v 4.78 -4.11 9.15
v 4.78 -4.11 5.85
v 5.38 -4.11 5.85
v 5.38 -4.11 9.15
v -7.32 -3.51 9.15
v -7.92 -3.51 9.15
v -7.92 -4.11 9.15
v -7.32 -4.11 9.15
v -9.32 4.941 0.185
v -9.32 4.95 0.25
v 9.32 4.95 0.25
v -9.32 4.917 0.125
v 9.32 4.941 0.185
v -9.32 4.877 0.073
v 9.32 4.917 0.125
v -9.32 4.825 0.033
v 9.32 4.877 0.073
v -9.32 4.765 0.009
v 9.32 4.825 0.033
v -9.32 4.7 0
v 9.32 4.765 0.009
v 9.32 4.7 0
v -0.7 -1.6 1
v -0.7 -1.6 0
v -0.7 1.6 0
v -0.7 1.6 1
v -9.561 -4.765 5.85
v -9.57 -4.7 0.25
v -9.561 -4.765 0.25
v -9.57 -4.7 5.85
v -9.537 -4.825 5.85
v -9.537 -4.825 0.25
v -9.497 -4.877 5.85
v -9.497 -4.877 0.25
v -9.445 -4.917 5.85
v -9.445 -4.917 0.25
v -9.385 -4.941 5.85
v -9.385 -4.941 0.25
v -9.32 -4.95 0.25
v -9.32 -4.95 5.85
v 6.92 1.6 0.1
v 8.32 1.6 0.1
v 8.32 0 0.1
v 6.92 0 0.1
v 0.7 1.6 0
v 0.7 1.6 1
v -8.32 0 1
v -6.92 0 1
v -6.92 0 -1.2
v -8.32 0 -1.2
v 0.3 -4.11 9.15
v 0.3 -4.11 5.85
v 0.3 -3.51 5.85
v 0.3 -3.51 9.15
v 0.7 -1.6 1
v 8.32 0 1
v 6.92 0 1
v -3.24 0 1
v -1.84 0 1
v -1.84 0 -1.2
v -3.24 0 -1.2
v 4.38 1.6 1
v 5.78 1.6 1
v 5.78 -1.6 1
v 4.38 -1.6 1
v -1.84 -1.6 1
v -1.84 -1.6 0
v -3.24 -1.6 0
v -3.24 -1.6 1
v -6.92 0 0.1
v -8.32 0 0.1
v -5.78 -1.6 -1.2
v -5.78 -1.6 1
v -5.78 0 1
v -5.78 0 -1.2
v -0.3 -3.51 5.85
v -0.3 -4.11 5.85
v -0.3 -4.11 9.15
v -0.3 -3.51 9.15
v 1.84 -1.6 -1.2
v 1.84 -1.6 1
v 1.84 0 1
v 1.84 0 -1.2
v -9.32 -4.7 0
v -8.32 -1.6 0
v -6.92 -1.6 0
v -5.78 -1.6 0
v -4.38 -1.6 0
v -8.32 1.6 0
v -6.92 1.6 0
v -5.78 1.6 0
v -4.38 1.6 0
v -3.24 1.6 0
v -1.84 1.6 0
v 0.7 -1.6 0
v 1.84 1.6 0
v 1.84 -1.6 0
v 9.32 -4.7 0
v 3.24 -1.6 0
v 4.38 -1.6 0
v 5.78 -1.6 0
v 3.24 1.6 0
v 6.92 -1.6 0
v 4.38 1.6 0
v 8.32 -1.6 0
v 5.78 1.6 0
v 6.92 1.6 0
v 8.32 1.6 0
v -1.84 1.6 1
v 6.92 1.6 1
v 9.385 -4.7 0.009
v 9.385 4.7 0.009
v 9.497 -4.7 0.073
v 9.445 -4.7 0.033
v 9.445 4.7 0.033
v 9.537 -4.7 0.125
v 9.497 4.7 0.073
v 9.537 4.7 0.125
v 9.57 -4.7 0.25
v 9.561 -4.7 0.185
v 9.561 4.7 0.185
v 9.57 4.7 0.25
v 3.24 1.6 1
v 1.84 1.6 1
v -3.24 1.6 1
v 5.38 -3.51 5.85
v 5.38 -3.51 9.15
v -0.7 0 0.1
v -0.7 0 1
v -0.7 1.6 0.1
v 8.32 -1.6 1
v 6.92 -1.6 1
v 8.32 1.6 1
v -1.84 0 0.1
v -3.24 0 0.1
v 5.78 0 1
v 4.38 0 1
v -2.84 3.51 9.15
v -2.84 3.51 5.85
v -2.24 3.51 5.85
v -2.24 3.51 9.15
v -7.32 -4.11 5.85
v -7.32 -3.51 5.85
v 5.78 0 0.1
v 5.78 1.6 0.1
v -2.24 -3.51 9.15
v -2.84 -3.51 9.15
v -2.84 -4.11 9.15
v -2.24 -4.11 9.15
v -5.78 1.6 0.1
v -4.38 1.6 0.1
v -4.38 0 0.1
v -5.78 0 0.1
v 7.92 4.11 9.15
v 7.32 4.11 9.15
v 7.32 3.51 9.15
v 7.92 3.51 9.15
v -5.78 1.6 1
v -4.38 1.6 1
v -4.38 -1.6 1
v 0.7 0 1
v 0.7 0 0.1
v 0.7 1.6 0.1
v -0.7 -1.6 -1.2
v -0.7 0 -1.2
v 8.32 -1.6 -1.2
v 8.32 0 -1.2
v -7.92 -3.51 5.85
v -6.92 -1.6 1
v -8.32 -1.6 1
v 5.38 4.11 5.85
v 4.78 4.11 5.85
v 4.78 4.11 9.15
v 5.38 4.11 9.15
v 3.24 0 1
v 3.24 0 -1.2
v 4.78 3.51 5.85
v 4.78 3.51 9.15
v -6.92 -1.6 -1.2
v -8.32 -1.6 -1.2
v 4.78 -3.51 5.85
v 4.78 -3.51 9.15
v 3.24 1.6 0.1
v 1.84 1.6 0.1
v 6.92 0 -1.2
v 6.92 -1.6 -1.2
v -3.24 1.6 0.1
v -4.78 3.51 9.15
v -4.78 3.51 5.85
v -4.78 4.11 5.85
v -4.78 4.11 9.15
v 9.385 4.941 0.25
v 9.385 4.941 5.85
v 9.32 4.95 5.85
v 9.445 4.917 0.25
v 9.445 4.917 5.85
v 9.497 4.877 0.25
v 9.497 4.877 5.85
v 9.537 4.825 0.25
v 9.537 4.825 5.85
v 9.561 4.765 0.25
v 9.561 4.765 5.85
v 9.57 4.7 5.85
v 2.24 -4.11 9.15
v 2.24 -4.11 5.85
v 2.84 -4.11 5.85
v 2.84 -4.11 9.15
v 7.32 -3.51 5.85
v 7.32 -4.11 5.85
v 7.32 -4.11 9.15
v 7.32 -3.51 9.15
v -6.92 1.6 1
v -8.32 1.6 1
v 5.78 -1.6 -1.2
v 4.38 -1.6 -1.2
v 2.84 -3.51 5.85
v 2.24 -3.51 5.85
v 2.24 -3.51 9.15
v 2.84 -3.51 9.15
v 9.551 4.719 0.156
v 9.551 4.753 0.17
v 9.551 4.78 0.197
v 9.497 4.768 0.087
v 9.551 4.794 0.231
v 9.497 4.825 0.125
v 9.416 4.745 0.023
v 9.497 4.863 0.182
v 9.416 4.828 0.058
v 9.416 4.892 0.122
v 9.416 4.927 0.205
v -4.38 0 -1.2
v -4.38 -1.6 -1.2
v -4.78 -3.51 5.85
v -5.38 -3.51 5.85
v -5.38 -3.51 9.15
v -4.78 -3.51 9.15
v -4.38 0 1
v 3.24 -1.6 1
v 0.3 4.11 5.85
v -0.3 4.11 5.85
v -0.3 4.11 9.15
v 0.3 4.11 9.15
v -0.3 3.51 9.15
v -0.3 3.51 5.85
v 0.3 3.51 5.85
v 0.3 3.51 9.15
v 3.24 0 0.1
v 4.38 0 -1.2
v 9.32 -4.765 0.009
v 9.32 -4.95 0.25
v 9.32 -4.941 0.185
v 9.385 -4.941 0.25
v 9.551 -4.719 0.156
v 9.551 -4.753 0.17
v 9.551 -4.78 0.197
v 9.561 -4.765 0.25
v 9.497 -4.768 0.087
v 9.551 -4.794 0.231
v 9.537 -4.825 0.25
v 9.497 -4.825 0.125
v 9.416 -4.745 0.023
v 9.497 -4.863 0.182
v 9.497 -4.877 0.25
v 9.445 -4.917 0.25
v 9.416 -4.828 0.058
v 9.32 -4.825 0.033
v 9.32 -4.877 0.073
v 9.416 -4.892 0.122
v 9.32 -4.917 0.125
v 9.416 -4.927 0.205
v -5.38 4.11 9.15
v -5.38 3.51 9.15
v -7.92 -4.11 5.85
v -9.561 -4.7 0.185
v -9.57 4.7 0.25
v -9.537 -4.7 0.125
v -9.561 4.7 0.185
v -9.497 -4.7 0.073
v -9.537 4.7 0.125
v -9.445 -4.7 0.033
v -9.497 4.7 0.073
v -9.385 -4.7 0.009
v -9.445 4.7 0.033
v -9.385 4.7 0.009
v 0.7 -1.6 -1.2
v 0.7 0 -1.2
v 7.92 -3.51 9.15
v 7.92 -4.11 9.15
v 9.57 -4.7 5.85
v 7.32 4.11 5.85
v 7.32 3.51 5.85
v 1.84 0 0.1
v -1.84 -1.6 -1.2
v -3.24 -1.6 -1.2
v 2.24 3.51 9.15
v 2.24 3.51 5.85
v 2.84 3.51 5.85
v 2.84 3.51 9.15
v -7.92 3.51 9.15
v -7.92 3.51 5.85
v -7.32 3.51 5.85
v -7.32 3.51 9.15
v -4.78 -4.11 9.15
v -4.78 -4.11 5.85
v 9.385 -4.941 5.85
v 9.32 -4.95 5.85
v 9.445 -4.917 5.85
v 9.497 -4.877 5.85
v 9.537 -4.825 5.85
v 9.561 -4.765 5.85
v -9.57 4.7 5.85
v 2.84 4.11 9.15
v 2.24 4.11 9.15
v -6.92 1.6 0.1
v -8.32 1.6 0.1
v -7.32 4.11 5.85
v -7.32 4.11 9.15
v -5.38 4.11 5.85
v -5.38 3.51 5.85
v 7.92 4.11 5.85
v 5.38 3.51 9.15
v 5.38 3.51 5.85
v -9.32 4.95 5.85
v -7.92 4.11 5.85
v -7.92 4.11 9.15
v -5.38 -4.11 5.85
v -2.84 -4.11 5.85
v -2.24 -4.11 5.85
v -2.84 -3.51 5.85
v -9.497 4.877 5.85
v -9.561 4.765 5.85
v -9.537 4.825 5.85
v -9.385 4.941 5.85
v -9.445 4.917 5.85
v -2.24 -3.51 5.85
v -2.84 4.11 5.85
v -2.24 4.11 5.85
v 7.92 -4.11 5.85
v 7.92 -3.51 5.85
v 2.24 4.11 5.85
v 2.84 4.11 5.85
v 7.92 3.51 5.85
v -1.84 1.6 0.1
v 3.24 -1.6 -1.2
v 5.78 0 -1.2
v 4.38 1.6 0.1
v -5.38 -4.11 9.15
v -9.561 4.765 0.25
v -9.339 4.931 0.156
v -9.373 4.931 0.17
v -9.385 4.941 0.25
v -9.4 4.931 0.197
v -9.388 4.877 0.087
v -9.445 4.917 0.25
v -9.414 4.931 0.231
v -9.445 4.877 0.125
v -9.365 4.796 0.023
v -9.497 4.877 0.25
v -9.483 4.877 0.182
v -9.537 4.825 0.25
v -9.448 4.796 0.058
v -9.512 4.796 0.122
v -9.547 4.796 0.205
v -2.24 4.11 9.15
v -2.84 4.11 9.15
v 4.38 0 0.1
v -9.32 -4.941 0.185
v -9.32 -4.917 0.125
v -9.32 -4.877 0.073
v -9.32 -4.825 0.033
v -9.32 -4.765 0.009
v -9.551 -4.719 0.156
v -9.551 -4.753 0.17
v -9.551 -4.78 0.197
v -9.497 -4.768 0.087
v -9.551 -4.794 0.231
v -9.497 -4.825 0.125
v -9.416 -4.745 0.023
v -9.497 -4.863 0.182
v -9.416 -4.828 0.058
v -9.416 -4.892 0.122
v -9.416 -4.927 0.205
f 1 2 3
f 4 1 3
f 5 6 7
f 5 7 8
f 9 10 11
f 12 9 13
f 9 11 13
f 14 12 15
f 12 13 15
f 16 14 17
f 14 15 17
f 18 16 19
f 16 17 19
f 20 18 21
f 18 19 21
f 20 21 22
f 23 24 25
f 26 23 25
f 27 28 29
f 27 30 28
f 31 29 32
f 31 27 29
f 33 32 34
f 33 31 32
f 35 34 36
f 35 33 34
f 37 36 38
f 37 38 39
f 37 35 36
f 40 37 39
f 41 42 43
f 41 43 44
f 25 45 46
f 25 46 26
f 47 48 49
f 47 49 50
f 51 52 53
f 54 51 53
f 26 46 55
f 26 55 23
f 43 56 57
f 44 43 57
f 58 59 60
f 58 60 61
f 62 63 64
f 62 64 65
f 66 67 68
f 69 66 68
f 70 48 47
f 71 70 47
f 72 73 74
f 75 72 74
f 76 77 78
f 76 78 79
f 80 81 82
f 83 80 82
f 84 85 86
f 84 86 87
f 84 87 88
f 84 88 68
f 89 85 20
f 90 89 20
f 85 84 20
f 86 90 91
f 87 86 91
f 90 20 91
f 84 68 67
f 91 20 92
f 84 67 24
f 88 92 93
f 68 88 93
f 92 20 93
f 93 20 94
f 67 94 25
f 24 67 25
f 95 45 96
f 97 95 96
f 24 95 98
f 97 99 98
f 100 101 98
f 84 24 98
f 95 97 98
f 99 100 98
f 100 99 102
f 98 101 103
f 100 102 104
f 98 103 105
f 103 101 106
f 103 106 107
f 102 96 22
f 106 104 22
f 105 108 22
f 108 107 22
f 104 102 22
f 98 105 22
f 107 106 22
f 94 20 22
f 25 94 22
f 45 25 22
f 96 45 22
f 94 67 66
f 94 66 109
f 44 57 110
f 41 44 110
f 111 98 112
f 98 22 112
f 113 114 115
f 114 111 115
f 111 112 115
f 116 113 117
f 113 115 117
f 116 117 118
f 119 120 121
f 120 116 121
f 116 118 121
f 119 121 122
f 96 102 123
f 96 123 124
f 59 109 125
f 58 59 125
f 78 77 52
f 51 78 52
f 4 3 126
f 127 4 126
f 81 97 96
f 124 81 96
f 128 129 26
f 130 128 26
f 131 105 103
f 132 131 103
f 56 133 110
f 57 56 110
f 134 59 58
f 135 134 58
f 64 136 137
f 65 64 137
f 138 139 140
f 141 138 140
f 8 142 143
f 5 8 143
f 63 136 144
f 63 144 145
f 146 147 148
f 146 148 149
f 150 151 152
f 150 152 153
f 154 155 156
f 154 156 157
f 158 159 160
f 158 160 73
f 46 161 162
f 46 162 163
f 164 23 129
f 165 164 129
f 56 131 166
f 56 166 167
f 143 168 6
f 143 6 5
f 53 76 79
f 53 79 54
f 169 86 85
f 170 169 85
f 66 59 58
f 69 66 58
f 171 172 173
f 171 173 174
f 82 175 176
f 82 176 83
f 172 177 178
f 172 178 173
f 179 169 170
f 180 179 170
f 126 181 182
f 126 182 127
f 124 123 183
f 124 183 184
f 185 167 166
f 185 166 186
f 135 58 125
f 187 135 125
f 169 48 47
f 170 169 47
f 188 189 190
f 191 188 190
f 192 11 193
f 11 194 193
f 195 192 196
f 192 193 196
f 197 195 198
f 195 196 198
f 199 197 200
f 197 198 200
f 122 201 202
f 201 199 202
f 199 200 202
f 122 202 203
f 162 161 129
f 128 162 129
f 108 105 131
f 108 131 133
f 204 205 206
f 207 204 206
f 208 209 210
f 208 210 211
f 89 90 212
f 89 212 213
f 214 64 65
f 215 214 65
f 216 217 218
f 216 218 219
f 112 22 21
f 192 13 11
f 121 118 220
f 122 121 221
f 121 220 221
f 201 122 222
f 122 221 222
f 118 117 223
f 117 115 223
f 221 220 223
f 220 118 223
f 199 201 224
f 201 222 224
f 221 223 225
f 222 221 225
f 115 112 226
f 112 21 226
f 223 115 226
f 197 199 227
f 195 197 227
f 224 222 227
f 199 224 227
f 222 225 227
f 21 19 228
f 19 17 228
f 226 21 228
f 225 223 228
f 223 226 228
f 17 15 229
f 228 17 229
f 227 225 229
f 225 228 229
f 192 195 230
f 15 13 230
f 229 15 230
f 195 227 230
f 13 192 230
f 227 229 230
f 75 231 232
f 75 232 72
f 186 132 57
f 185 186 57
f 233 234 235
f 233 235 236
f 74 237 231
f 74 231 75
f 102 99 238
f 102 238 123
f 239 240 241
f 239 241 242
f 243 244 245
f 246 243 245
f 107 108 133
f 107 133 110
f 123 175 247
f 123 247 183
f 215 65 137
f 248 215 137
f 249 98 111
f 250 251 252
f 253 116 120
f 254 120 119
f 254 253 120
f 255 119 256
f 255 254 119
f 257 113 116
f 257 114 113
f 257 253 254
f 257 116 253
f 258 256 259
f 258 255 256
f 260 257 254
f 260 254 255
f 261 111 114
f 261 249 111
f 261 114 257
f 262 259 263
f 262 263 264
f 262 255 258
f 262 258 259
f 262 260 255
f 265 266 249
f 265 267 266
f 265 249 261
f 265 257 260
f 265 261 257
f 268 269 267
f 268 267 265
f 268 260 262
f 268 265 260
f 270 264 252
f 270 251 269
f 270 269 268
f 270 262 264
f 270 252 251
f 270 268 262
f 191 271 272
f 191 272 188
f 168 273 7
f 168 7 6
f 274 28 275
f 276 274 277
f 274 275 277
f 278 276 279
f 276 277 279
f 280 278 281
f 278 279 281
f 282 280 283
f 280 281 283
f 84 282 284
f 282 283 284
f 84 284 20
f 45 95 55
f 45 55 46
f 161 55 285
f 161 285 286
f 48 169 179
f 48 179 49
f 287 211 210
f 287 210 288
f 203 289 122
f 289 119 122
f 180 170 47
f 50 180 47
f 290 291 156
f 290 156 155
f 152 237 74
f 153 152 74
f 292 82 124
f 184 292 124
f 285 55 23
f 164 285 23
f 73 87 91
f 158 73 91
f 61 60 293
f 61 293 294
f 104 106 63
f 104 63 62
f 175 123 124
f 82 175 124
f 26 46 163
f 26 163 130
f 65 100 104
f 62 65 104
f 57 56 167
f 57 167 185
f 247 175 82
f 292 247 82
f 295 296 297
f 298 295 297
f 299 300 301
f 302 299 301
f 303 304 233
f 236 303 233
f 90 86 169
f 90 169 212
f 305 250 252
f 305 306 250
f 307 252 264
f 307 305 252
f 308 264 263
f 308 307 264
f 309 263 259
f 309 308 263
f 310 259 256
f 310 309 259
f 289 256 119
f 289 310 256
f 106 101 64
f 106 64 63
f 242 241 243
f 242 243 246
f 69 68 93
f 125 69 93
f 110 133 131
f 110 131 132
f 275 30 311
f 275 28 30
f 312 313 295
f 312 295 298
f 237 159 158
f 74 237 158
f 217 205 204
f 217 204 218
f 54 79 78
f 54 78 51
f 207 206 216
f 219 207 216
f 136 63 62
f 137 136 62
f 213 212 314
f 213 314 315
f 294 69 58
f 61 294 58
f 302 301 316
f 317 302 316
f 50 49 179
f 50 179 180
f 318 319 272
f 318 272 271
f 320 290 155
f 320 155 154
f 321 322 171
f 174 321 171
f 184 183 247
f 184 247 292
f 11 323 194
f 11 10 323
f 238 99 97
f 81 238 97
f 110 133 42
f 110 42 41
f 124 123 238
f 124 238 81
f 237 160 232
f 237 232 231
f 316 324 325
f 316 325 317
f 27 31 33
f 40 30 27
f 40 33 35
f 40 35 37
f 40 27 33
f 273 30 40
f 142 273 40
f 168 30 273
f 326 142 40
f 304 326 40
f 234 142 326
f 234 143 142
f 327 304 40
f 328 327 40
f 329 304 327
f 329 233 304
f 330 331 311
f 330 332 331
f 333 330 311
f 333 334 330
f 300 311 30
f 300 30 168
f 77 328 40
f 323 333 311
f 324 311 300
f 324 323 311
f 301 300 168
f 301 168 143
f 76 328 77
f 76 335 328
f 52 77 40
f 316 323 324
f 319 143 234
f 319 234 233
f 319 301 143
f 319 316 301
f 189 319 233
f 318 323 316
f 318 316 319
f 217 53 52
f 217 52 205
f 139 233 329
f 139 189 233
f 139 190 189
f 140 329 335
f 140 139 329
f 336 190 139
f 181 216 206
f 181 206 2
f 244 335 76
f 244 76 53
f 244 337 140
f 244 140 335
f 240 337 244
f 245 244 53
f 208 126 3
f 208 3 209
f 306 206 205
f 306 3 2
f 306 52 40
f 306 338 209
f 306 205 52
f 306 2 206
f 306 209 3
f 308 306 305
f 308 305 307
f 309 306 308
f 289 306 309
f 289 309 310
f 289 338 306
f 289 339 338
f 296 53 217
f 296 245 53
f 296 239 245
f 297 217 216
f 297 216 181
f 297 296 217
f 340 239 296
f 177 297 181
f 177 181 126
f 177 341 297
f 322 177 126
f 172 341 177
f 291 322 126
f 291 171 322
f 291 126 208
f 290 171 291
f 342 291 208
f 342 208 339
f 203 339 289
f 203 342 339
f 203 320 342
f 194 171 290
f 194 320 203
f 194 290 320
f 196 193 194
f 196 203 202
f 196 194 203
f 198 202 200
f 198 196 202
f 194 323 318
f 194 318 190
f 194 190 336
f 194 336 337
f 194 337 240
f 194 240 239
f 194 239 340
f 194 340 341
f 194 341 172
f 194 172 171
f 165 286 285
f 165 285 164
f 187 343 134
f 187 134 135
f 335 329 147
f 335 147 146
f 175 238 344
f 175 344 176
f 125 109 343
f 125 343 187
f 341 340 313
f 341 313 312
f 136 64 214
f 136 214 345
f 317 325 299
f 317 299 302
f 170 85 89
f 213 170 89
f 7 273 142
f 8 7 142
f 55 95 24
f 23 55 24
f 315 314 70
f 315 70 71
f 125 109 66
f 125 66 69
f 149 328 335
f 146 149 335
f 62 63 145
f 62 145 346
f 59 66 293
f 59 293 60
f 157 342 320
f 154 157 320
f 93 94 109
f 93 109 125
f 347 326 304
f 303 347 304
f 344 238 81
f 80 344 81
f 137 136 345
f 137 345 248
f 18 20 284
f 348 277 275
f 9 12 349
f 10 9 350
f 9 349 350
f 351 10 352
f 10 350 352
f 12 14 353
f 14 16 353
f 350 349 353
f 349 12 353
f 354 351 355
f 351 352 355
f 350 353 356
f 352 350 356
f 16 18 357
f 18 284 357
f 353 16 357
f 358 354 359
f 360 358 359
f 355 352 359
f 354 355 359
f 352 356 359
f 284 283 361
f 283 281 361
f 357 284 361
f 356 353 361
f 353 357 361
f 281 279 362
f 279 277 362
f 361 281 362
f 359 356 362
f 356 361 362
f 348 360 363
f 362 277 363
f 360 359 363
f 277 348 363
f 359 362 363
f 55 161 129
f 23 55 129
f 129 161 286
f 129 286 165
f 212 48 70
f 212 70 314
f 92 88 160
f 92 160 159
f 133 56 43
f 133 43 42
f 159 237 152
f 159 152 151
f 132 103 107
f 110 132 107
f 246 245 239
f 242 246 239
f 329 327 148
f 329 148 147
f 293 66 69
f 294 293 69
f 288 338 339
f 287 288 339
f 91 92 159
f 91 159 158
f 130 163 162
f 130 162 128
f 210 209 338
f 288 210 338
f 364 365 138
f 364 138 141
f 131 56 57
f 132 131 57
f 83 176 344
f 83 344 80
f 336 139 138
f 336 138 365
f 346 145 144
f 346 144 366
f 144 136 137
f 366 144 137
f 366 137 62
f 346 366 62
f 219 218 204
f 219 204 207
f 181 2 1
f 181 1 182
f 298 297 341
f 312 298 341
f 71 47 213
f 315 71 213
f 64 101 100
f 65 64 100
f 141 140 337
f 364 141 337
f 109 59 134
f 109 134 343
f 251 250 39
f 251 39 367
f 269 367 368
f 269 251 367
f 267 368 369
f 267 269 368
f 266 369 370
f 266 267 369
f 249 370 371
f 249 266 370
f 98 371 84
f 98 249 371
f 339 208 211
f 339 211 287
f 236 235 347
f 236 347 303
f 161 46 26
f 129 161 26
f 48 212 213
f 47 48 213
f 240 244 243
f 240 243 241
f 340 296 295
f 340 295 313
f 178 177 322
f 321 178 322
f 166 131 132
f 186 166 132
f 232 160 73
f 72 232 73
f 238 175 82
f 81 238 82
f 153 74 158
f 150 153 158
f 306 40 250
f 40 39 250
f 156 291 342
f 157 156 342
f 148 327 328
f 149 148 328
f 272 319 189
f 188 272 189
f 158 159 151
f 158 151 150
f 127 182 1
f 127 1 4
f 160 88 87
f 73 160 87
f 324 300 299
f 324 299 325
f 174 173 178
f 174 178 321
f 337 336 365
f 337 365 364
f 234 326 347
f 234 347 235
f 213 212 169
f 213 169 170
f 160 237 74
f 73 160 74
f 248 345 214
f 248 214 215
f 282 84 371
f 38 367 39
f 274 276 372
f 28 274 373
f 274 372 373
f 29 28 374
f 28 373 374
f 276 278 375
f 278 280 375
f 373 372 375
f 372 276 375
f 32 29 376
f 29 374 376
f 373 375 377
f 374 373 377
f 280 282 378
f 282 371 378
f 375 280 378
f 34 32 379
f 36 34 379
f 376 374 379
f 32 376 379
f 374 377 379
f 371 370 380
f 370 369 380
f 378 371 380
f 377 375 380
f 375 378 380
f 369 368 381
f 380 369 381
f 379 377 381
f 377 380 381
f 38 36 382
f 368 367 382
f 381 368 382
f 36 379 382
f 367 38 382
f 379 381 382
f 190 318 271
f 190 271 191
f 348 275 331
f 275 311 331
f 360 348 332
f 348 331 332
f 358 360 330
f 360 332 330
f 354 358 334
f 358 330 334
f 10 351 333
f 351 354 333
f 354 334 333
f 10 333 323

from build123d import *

# Parameters (mm, degrees)
IZIM1_W                       = 19.14
IZIM1_H                       = 9.9
Y_KSEKLIK_EKSTR_ZYON1_DEPTH   = 5.85
IZIM2_W                       = 1.4
IZIM2_H                       = 3.2
KES_EKSTR_ZYON1_DEPTH         = 1
IZIM3_W                       = 1.4
IZIM3_H                       = 1.6
Y_KSEKLIK_EKSTR_ZYON2_DEPTH   = 2.2
Y_KSEKLIK_EKSTR_ZYON2_2_DEPTH = 2.2
Y_KSEKLIK_EKSTR_ZYON2_3_DEPTH = 2.2
Y_KSEKLIK_EKSTR_ZYON2_4_DEPTH = 2.2
Y_KSEKLIK_EKSTR_ZYON2_5_DEPTH = 2.2
Y_KSEKLIK_EKSTR_ZYON2_6_DEPTH = 2.2
Y_KSEKLIK_EKSTR_ZYON2_7_DEPTH = 2.2
IZIM4_W                       = 1.4
IZIM4_H                       = 1.6
Y_KSEKLIK_EKSTR_ZYON3_DEPTH   = 0.9
Y_KSEKLIK_EKSTR_ZYON3_2_DEPTH = 0.9
Y_KSEKLIK_EKSTR_ZYON3_3_DEPTH = 0.9
Y_KSEKLIK_EKSTR_ZYON3_4_DEPTH = 0.9
Y_KSEKLIK_EKSTR_ZYON3_5_DEPTH = 0.9
Y_KSEKLIK_EKSTR_ZYON3_6_DEPTH = 0.9
Y_KSEKLIK_EKSTR_ZYON3_7_DEPTH = 0.9
RADYUS1_R                     = 0.25
IZIM5_W                       = 0.6
IZIM5_H                       = 0.6
Y_KSEKLIK_EKSTR_ZYON4_DEPTH   = 3.3


with BuildPart() as part:
    # Çizim1 → Yükseklik-Ekstrüzyon1 (new body)
    with BuildSketch(Plane.XY):
        Rectangle(IZIM1_W, IZIM1_H)
    extrude(amount=Y_KSEKLIK_EKSTR_ZYON1_DEPTH)

    # Çizim2 → Kes-Ekstrüzyon1 (cut)
    with BuildSketch(Plane(origin=(0, 0, 0), x_dir=(-1, 0, 0), z_dir=(0, 0, -1))):
        with Locations((-7.62, 0)):
            Rectangle(IZIM2_W, IZIM2_H)
        with Locations((-5.08, 0)):
            Rectangle(IZIM2_W, IZIM2_H)
        with Locations((-2.54, 0)):
            Rectangle(IZIM2_W, IZIM2_H)
        Rectangle(IZIM2_W, IZIM2_H)
        with Locations((2.54, 0)):
            Rectangle(IZIM2_W, IZIM2_H)
        with Locations((5.08, 0)):
            Rectangle(IZIM2_W, IZIM2_H)
        with Locations((7.62, 0)):
            Rectangle(IZIM2_W, IZIM2_H)
    extrude(amount=-KES_EKSTR_ZYON1_DEPTH, mode=Mode.SUBTRACT)

    # Radyus1
    radyus1_edges = [part.edges().sort_by_distance(p)[0] for p in [
        (0, -4.95, 0),
        (-9.57, 0, 0),
        (0, 4.95, 0),
        (9.57, 0, 0),
        (9.57, -4.95, 2.925),
        (-9.57, -4.95, 2.925),
        (-9.57, 4.95, 2.925),
        (9.57, 4.95, 2.925),
    ]]
    fillet(radyus1_edges, radius=RADYUS1_R)

    # Çizim5 → Yükseklik-Ekstrüzyon4 (add)
    with BuildSketch(Plane.XY.offset(5.85)):
        with Locations((-7.62, 3.81)):
            Rectangle(IZIM5_W, IZIM5_H)
        with Locations((-5.08, 3.81)):
            Rectangle(IZIM5_W, IZIM5_H)
        with Locations((-2.54, 3.81)):
            Rectangle(IZIM5_W, IZIM5_H)
        with Locations((0, 3.81)):
            Rectangle(IZIM5_W, IZIM5_H)
        with Locations((2.54, 3.81)):
            Rectangle(IZIM5_W, IZIM5_H)
        with Locations((5.08, 3.81)):
            Rectangle(IZIM5_W, IZIM5_H)
        with Locations((7.62, 3.81)):
            Rectangle(IZIM5_W, IZIM5_H)
        with Locations((7.62, -3.81)):
            Rectangle(IZIM5_W, IZIM5_H)
        with Locations((5.08, -3.81)):
            Rectangle(IZIM5_W, IZIM5_H)
        with Locations((2.54, -3.81)):
            Rectangle(IZIM5_W, IZIM5_H)
        with Locations((0, -3.81)):
            Rectangle(IZIM5_W, IZIM5_H)
        with Locations((-2.54, -3.81)):
            Rectangle(IZIM5_W, IZIM5_H)
        with Locations((-5.08, -3.81)):
            Rectangle(IZIM5_W, IZIM5_H)
        with Locations((-7.62, -3.81)):
            Rectangle(IZIM5_W, IZIM5_H)
    extrude(amount=Y_KSEKLIK_EKSTR_ZYON4_DEPTH)


with BuildPart() as body_2:
    # Çizim3 → Yükseklik-Ekstrüzyon2 (new body)
    with BuildSketch(Plane(origin=(0, 0, 1), x_dir=(-1, 0, 0), z_dir=(0, 0, -1))):
        with Locations((-7.62, -0.8)):
            Rectangle(IZIM3_W, IZIM3_H)
    extrude(amount=Y_KSEKLIK_EKSTR_ZYON2_DEPTH)


with BuildPart() as body_3:
    # Çizim3 → Y_kseklik-Ekstr_zyon2 2 (new body)
    with BuildSketch(Plane(origin=(0, 0, 1), x_dir=(-1, 0, 0), z_dir=(0, 0, -1))):
        with Locations((-5.08, -0.8)):
            Rectangle(IZIM3_W, IZIM3_H)
    extrude(amount=Y_KSEKLIK_EKSTR_ZYON2_2_DEPTH)


with BuildPart() as body_4:
    # Çizim3 → Y_kseklik-Ekstr_zyon2 3 (new body)
    with BuildSketch(Plane(origin=(0, 0, 1), x_dir=(-1, 0, 0), z_dir=(0, 0, -1))):
        with Locations((-2.54, -0.8)):
            Rectangle(IZIM3_W, IZIM3_H)
    extrude(amount=Y_KSEKLIK_EKSTR_ZYON2_3_DEPTH)


with BuildPart() as body_5:
    # Çizim3 → Y_kseklik-Ekstr_zyon2 4 (new body)
    with BuildSketch(Plane(origin=(0, 0, 1), x_dir=(-1, 0, 0), z_dir=(0, 0, -1))):
        with Locations((0, -0.8)):
            Rectangle(IZIM3_W, IZIM3_H)
    extrude(amount=Y_KSEKLIK_EKSTR_ZYON2_4_DEPTH)


with BuildPart() as body_6:
    # Çizim3 → Y_kseklik-Ekstr_zyon2 5 (new body)
    with BuildSketch(Plane(origin=(0, 0, 1), x_dir=(-1, 0, 0), z_dir=(0, 0, -1))):
        with Locations((2.54, -0.8)):
            Rectangle(IZIM3_W, IZIM3_H)
    extrude(amount=Y_KSEKLIK_EKSTR_ZYON2_5_DEPTH)


with BuildPart() as body_7:
    # Çizim3 → Y_kseklik-Ekstr_zyon2 6 (new body)
    with BuildSketch(Plane(origin=(0, 0, 1), x_dir=(-1, 0, 0), z_dir=(0, 0, -1))):
        with Locations((5.08, -0.8)):
            Rectangle(IZIM3_W, IZIM3_H)
    extrude(amount=Y_KSEKLIK_EKSTR_ZYON2_6_DEPTH)


with BuildPart() as body_8:
    # Çizim3 → Y_kseklik-Ekstr_zyon2 7 (new body)
    with BuildSketch(Plane(origin=(0, 0, 1), x_dir=(-1, 0, 0), z_dir=(0, 0, -1))):
        with Locations((7.62, -0.8)):
            Rectangle(IZIM3_W, IZIM3_H)
    extrude(amount=Y_KSEKLIK_EKSTR_ZYON2_7_DEPTH)


with BuildPart() as body_9:
    # Çizim4 → Yükseklik-Ekstrüzyon3 (new body)
    with BuildSketch(Plane(origin=(0, 0, 1), x_dir=(-1, 0, 0), z_dir=(0, 0, -1))):
        with Locations((-7.62, 0.8)):
            Rectangle(IZIM4_W, IZIM4_H)
    extrude(amount=Y_KSEKLIK_EKSTR_ZYON3_DEPTH)


with BuildPart() as body_10:
    # Çizim4 → Y_kseklik-Ekstr_zyon3 2 (new body)
    with BuildSketch(Plane(origin=(0, 0, 1), x_dir=(-1, 0, 0), z_dir=(0, 0, -1))):
        with Locations((-5.08, 0.8)):
            Rectangle(IZIM4_W, IZIM4_H)
    extrude(amount=Y_KSEKLIK_EKSTR_ZYON3_2_DEPTH)


with BuildPart() as body_11:
    # Çizim4 → Y_kseklik-Ekstr_zyon3 3 (new body)
    with BuildSketch(Plane(origin=(0, 0, 1), x_dir=(-1, 0, 0), z_dir=(0, 0, -1))):
        with Locations((-2.54, 0.8)):
            Rectangle(IZIM4_W, IZIM4_H)
    extrude(amount=Y_KSEKLIK_EKSTR_ZYON3_3_DEPTH)


with BuildPart() as body_12:
    # Çizim4 → Y_kseklik-Ekstr_zyon3 4 (new body)
    with BuildSketch(Plane(origin=(0, 0, 1), x_dir=(-1, 0, 0), z_dir=(0, 0, -1))):
        with Locations((0, 0.8)):
            Rectangle(IZIM4_W, IZIM4_H)
    extrude(amount=Y_KSEKLIK_EKSTR_ZYON3_4_DEPTH)


with BuildPart() as body_13:
    # Çizim4 → Y_kseklik-Ekstr_zyon3 5 (new body)
    with BuildSketch(Plane(origin=(0, 0, 1), x_dir=(-1, 0, 0), z_dir=(0, 0, -1))):
        with Locations((2.54, 0.8)):
            Rectangle(IZIM4_W, IZIM4_H)
    extrude(amount=Y_KSEKLIK_EKSTR_ZYON3_5_DEPTH)


with BuildPart() as body_14:
    # Çizim4 → Y_kseklik-Ekstr_zyon3 6 (new body)
    with BuildSketch(Plane(origin=(0, 0, 1), x_dir=(-1, 0, 0), z_dir=(0, 0, -1))):
        with Locations((5.08, 0.8)):
            Rectangle(IZIM4_W, IZIM4_H)
    extrude(amount=Y_KSEKLIK_EKSTR_ZYON3_6_DEPTH)


with BuildPart() as body_15:
    # Çizim4 → Y_kseklik-Ekstr_zyon3 7 (new body)
    with BuildSketch(Plane(origin=(0, 0, 1), x_dir=(-1, 0, 0), z_dir=(0, 0, -1))):
        with Locations((7.62, 0.8)):
            Rectangle(IZIM4_W, IZIM4_H)
    extrude(amount=Y_KSEKLIK_EKSTR_ZYON3_7_DEPTH)


solid = Compound([part.part, body_2.part, body_3.part, body_4.part, body_5.part, body_6.part, body_7.part, body_8.part, body_9.part, body_10.part, body_11.part, body_12.part, body_13.part, body_14.part, body_15.part])
